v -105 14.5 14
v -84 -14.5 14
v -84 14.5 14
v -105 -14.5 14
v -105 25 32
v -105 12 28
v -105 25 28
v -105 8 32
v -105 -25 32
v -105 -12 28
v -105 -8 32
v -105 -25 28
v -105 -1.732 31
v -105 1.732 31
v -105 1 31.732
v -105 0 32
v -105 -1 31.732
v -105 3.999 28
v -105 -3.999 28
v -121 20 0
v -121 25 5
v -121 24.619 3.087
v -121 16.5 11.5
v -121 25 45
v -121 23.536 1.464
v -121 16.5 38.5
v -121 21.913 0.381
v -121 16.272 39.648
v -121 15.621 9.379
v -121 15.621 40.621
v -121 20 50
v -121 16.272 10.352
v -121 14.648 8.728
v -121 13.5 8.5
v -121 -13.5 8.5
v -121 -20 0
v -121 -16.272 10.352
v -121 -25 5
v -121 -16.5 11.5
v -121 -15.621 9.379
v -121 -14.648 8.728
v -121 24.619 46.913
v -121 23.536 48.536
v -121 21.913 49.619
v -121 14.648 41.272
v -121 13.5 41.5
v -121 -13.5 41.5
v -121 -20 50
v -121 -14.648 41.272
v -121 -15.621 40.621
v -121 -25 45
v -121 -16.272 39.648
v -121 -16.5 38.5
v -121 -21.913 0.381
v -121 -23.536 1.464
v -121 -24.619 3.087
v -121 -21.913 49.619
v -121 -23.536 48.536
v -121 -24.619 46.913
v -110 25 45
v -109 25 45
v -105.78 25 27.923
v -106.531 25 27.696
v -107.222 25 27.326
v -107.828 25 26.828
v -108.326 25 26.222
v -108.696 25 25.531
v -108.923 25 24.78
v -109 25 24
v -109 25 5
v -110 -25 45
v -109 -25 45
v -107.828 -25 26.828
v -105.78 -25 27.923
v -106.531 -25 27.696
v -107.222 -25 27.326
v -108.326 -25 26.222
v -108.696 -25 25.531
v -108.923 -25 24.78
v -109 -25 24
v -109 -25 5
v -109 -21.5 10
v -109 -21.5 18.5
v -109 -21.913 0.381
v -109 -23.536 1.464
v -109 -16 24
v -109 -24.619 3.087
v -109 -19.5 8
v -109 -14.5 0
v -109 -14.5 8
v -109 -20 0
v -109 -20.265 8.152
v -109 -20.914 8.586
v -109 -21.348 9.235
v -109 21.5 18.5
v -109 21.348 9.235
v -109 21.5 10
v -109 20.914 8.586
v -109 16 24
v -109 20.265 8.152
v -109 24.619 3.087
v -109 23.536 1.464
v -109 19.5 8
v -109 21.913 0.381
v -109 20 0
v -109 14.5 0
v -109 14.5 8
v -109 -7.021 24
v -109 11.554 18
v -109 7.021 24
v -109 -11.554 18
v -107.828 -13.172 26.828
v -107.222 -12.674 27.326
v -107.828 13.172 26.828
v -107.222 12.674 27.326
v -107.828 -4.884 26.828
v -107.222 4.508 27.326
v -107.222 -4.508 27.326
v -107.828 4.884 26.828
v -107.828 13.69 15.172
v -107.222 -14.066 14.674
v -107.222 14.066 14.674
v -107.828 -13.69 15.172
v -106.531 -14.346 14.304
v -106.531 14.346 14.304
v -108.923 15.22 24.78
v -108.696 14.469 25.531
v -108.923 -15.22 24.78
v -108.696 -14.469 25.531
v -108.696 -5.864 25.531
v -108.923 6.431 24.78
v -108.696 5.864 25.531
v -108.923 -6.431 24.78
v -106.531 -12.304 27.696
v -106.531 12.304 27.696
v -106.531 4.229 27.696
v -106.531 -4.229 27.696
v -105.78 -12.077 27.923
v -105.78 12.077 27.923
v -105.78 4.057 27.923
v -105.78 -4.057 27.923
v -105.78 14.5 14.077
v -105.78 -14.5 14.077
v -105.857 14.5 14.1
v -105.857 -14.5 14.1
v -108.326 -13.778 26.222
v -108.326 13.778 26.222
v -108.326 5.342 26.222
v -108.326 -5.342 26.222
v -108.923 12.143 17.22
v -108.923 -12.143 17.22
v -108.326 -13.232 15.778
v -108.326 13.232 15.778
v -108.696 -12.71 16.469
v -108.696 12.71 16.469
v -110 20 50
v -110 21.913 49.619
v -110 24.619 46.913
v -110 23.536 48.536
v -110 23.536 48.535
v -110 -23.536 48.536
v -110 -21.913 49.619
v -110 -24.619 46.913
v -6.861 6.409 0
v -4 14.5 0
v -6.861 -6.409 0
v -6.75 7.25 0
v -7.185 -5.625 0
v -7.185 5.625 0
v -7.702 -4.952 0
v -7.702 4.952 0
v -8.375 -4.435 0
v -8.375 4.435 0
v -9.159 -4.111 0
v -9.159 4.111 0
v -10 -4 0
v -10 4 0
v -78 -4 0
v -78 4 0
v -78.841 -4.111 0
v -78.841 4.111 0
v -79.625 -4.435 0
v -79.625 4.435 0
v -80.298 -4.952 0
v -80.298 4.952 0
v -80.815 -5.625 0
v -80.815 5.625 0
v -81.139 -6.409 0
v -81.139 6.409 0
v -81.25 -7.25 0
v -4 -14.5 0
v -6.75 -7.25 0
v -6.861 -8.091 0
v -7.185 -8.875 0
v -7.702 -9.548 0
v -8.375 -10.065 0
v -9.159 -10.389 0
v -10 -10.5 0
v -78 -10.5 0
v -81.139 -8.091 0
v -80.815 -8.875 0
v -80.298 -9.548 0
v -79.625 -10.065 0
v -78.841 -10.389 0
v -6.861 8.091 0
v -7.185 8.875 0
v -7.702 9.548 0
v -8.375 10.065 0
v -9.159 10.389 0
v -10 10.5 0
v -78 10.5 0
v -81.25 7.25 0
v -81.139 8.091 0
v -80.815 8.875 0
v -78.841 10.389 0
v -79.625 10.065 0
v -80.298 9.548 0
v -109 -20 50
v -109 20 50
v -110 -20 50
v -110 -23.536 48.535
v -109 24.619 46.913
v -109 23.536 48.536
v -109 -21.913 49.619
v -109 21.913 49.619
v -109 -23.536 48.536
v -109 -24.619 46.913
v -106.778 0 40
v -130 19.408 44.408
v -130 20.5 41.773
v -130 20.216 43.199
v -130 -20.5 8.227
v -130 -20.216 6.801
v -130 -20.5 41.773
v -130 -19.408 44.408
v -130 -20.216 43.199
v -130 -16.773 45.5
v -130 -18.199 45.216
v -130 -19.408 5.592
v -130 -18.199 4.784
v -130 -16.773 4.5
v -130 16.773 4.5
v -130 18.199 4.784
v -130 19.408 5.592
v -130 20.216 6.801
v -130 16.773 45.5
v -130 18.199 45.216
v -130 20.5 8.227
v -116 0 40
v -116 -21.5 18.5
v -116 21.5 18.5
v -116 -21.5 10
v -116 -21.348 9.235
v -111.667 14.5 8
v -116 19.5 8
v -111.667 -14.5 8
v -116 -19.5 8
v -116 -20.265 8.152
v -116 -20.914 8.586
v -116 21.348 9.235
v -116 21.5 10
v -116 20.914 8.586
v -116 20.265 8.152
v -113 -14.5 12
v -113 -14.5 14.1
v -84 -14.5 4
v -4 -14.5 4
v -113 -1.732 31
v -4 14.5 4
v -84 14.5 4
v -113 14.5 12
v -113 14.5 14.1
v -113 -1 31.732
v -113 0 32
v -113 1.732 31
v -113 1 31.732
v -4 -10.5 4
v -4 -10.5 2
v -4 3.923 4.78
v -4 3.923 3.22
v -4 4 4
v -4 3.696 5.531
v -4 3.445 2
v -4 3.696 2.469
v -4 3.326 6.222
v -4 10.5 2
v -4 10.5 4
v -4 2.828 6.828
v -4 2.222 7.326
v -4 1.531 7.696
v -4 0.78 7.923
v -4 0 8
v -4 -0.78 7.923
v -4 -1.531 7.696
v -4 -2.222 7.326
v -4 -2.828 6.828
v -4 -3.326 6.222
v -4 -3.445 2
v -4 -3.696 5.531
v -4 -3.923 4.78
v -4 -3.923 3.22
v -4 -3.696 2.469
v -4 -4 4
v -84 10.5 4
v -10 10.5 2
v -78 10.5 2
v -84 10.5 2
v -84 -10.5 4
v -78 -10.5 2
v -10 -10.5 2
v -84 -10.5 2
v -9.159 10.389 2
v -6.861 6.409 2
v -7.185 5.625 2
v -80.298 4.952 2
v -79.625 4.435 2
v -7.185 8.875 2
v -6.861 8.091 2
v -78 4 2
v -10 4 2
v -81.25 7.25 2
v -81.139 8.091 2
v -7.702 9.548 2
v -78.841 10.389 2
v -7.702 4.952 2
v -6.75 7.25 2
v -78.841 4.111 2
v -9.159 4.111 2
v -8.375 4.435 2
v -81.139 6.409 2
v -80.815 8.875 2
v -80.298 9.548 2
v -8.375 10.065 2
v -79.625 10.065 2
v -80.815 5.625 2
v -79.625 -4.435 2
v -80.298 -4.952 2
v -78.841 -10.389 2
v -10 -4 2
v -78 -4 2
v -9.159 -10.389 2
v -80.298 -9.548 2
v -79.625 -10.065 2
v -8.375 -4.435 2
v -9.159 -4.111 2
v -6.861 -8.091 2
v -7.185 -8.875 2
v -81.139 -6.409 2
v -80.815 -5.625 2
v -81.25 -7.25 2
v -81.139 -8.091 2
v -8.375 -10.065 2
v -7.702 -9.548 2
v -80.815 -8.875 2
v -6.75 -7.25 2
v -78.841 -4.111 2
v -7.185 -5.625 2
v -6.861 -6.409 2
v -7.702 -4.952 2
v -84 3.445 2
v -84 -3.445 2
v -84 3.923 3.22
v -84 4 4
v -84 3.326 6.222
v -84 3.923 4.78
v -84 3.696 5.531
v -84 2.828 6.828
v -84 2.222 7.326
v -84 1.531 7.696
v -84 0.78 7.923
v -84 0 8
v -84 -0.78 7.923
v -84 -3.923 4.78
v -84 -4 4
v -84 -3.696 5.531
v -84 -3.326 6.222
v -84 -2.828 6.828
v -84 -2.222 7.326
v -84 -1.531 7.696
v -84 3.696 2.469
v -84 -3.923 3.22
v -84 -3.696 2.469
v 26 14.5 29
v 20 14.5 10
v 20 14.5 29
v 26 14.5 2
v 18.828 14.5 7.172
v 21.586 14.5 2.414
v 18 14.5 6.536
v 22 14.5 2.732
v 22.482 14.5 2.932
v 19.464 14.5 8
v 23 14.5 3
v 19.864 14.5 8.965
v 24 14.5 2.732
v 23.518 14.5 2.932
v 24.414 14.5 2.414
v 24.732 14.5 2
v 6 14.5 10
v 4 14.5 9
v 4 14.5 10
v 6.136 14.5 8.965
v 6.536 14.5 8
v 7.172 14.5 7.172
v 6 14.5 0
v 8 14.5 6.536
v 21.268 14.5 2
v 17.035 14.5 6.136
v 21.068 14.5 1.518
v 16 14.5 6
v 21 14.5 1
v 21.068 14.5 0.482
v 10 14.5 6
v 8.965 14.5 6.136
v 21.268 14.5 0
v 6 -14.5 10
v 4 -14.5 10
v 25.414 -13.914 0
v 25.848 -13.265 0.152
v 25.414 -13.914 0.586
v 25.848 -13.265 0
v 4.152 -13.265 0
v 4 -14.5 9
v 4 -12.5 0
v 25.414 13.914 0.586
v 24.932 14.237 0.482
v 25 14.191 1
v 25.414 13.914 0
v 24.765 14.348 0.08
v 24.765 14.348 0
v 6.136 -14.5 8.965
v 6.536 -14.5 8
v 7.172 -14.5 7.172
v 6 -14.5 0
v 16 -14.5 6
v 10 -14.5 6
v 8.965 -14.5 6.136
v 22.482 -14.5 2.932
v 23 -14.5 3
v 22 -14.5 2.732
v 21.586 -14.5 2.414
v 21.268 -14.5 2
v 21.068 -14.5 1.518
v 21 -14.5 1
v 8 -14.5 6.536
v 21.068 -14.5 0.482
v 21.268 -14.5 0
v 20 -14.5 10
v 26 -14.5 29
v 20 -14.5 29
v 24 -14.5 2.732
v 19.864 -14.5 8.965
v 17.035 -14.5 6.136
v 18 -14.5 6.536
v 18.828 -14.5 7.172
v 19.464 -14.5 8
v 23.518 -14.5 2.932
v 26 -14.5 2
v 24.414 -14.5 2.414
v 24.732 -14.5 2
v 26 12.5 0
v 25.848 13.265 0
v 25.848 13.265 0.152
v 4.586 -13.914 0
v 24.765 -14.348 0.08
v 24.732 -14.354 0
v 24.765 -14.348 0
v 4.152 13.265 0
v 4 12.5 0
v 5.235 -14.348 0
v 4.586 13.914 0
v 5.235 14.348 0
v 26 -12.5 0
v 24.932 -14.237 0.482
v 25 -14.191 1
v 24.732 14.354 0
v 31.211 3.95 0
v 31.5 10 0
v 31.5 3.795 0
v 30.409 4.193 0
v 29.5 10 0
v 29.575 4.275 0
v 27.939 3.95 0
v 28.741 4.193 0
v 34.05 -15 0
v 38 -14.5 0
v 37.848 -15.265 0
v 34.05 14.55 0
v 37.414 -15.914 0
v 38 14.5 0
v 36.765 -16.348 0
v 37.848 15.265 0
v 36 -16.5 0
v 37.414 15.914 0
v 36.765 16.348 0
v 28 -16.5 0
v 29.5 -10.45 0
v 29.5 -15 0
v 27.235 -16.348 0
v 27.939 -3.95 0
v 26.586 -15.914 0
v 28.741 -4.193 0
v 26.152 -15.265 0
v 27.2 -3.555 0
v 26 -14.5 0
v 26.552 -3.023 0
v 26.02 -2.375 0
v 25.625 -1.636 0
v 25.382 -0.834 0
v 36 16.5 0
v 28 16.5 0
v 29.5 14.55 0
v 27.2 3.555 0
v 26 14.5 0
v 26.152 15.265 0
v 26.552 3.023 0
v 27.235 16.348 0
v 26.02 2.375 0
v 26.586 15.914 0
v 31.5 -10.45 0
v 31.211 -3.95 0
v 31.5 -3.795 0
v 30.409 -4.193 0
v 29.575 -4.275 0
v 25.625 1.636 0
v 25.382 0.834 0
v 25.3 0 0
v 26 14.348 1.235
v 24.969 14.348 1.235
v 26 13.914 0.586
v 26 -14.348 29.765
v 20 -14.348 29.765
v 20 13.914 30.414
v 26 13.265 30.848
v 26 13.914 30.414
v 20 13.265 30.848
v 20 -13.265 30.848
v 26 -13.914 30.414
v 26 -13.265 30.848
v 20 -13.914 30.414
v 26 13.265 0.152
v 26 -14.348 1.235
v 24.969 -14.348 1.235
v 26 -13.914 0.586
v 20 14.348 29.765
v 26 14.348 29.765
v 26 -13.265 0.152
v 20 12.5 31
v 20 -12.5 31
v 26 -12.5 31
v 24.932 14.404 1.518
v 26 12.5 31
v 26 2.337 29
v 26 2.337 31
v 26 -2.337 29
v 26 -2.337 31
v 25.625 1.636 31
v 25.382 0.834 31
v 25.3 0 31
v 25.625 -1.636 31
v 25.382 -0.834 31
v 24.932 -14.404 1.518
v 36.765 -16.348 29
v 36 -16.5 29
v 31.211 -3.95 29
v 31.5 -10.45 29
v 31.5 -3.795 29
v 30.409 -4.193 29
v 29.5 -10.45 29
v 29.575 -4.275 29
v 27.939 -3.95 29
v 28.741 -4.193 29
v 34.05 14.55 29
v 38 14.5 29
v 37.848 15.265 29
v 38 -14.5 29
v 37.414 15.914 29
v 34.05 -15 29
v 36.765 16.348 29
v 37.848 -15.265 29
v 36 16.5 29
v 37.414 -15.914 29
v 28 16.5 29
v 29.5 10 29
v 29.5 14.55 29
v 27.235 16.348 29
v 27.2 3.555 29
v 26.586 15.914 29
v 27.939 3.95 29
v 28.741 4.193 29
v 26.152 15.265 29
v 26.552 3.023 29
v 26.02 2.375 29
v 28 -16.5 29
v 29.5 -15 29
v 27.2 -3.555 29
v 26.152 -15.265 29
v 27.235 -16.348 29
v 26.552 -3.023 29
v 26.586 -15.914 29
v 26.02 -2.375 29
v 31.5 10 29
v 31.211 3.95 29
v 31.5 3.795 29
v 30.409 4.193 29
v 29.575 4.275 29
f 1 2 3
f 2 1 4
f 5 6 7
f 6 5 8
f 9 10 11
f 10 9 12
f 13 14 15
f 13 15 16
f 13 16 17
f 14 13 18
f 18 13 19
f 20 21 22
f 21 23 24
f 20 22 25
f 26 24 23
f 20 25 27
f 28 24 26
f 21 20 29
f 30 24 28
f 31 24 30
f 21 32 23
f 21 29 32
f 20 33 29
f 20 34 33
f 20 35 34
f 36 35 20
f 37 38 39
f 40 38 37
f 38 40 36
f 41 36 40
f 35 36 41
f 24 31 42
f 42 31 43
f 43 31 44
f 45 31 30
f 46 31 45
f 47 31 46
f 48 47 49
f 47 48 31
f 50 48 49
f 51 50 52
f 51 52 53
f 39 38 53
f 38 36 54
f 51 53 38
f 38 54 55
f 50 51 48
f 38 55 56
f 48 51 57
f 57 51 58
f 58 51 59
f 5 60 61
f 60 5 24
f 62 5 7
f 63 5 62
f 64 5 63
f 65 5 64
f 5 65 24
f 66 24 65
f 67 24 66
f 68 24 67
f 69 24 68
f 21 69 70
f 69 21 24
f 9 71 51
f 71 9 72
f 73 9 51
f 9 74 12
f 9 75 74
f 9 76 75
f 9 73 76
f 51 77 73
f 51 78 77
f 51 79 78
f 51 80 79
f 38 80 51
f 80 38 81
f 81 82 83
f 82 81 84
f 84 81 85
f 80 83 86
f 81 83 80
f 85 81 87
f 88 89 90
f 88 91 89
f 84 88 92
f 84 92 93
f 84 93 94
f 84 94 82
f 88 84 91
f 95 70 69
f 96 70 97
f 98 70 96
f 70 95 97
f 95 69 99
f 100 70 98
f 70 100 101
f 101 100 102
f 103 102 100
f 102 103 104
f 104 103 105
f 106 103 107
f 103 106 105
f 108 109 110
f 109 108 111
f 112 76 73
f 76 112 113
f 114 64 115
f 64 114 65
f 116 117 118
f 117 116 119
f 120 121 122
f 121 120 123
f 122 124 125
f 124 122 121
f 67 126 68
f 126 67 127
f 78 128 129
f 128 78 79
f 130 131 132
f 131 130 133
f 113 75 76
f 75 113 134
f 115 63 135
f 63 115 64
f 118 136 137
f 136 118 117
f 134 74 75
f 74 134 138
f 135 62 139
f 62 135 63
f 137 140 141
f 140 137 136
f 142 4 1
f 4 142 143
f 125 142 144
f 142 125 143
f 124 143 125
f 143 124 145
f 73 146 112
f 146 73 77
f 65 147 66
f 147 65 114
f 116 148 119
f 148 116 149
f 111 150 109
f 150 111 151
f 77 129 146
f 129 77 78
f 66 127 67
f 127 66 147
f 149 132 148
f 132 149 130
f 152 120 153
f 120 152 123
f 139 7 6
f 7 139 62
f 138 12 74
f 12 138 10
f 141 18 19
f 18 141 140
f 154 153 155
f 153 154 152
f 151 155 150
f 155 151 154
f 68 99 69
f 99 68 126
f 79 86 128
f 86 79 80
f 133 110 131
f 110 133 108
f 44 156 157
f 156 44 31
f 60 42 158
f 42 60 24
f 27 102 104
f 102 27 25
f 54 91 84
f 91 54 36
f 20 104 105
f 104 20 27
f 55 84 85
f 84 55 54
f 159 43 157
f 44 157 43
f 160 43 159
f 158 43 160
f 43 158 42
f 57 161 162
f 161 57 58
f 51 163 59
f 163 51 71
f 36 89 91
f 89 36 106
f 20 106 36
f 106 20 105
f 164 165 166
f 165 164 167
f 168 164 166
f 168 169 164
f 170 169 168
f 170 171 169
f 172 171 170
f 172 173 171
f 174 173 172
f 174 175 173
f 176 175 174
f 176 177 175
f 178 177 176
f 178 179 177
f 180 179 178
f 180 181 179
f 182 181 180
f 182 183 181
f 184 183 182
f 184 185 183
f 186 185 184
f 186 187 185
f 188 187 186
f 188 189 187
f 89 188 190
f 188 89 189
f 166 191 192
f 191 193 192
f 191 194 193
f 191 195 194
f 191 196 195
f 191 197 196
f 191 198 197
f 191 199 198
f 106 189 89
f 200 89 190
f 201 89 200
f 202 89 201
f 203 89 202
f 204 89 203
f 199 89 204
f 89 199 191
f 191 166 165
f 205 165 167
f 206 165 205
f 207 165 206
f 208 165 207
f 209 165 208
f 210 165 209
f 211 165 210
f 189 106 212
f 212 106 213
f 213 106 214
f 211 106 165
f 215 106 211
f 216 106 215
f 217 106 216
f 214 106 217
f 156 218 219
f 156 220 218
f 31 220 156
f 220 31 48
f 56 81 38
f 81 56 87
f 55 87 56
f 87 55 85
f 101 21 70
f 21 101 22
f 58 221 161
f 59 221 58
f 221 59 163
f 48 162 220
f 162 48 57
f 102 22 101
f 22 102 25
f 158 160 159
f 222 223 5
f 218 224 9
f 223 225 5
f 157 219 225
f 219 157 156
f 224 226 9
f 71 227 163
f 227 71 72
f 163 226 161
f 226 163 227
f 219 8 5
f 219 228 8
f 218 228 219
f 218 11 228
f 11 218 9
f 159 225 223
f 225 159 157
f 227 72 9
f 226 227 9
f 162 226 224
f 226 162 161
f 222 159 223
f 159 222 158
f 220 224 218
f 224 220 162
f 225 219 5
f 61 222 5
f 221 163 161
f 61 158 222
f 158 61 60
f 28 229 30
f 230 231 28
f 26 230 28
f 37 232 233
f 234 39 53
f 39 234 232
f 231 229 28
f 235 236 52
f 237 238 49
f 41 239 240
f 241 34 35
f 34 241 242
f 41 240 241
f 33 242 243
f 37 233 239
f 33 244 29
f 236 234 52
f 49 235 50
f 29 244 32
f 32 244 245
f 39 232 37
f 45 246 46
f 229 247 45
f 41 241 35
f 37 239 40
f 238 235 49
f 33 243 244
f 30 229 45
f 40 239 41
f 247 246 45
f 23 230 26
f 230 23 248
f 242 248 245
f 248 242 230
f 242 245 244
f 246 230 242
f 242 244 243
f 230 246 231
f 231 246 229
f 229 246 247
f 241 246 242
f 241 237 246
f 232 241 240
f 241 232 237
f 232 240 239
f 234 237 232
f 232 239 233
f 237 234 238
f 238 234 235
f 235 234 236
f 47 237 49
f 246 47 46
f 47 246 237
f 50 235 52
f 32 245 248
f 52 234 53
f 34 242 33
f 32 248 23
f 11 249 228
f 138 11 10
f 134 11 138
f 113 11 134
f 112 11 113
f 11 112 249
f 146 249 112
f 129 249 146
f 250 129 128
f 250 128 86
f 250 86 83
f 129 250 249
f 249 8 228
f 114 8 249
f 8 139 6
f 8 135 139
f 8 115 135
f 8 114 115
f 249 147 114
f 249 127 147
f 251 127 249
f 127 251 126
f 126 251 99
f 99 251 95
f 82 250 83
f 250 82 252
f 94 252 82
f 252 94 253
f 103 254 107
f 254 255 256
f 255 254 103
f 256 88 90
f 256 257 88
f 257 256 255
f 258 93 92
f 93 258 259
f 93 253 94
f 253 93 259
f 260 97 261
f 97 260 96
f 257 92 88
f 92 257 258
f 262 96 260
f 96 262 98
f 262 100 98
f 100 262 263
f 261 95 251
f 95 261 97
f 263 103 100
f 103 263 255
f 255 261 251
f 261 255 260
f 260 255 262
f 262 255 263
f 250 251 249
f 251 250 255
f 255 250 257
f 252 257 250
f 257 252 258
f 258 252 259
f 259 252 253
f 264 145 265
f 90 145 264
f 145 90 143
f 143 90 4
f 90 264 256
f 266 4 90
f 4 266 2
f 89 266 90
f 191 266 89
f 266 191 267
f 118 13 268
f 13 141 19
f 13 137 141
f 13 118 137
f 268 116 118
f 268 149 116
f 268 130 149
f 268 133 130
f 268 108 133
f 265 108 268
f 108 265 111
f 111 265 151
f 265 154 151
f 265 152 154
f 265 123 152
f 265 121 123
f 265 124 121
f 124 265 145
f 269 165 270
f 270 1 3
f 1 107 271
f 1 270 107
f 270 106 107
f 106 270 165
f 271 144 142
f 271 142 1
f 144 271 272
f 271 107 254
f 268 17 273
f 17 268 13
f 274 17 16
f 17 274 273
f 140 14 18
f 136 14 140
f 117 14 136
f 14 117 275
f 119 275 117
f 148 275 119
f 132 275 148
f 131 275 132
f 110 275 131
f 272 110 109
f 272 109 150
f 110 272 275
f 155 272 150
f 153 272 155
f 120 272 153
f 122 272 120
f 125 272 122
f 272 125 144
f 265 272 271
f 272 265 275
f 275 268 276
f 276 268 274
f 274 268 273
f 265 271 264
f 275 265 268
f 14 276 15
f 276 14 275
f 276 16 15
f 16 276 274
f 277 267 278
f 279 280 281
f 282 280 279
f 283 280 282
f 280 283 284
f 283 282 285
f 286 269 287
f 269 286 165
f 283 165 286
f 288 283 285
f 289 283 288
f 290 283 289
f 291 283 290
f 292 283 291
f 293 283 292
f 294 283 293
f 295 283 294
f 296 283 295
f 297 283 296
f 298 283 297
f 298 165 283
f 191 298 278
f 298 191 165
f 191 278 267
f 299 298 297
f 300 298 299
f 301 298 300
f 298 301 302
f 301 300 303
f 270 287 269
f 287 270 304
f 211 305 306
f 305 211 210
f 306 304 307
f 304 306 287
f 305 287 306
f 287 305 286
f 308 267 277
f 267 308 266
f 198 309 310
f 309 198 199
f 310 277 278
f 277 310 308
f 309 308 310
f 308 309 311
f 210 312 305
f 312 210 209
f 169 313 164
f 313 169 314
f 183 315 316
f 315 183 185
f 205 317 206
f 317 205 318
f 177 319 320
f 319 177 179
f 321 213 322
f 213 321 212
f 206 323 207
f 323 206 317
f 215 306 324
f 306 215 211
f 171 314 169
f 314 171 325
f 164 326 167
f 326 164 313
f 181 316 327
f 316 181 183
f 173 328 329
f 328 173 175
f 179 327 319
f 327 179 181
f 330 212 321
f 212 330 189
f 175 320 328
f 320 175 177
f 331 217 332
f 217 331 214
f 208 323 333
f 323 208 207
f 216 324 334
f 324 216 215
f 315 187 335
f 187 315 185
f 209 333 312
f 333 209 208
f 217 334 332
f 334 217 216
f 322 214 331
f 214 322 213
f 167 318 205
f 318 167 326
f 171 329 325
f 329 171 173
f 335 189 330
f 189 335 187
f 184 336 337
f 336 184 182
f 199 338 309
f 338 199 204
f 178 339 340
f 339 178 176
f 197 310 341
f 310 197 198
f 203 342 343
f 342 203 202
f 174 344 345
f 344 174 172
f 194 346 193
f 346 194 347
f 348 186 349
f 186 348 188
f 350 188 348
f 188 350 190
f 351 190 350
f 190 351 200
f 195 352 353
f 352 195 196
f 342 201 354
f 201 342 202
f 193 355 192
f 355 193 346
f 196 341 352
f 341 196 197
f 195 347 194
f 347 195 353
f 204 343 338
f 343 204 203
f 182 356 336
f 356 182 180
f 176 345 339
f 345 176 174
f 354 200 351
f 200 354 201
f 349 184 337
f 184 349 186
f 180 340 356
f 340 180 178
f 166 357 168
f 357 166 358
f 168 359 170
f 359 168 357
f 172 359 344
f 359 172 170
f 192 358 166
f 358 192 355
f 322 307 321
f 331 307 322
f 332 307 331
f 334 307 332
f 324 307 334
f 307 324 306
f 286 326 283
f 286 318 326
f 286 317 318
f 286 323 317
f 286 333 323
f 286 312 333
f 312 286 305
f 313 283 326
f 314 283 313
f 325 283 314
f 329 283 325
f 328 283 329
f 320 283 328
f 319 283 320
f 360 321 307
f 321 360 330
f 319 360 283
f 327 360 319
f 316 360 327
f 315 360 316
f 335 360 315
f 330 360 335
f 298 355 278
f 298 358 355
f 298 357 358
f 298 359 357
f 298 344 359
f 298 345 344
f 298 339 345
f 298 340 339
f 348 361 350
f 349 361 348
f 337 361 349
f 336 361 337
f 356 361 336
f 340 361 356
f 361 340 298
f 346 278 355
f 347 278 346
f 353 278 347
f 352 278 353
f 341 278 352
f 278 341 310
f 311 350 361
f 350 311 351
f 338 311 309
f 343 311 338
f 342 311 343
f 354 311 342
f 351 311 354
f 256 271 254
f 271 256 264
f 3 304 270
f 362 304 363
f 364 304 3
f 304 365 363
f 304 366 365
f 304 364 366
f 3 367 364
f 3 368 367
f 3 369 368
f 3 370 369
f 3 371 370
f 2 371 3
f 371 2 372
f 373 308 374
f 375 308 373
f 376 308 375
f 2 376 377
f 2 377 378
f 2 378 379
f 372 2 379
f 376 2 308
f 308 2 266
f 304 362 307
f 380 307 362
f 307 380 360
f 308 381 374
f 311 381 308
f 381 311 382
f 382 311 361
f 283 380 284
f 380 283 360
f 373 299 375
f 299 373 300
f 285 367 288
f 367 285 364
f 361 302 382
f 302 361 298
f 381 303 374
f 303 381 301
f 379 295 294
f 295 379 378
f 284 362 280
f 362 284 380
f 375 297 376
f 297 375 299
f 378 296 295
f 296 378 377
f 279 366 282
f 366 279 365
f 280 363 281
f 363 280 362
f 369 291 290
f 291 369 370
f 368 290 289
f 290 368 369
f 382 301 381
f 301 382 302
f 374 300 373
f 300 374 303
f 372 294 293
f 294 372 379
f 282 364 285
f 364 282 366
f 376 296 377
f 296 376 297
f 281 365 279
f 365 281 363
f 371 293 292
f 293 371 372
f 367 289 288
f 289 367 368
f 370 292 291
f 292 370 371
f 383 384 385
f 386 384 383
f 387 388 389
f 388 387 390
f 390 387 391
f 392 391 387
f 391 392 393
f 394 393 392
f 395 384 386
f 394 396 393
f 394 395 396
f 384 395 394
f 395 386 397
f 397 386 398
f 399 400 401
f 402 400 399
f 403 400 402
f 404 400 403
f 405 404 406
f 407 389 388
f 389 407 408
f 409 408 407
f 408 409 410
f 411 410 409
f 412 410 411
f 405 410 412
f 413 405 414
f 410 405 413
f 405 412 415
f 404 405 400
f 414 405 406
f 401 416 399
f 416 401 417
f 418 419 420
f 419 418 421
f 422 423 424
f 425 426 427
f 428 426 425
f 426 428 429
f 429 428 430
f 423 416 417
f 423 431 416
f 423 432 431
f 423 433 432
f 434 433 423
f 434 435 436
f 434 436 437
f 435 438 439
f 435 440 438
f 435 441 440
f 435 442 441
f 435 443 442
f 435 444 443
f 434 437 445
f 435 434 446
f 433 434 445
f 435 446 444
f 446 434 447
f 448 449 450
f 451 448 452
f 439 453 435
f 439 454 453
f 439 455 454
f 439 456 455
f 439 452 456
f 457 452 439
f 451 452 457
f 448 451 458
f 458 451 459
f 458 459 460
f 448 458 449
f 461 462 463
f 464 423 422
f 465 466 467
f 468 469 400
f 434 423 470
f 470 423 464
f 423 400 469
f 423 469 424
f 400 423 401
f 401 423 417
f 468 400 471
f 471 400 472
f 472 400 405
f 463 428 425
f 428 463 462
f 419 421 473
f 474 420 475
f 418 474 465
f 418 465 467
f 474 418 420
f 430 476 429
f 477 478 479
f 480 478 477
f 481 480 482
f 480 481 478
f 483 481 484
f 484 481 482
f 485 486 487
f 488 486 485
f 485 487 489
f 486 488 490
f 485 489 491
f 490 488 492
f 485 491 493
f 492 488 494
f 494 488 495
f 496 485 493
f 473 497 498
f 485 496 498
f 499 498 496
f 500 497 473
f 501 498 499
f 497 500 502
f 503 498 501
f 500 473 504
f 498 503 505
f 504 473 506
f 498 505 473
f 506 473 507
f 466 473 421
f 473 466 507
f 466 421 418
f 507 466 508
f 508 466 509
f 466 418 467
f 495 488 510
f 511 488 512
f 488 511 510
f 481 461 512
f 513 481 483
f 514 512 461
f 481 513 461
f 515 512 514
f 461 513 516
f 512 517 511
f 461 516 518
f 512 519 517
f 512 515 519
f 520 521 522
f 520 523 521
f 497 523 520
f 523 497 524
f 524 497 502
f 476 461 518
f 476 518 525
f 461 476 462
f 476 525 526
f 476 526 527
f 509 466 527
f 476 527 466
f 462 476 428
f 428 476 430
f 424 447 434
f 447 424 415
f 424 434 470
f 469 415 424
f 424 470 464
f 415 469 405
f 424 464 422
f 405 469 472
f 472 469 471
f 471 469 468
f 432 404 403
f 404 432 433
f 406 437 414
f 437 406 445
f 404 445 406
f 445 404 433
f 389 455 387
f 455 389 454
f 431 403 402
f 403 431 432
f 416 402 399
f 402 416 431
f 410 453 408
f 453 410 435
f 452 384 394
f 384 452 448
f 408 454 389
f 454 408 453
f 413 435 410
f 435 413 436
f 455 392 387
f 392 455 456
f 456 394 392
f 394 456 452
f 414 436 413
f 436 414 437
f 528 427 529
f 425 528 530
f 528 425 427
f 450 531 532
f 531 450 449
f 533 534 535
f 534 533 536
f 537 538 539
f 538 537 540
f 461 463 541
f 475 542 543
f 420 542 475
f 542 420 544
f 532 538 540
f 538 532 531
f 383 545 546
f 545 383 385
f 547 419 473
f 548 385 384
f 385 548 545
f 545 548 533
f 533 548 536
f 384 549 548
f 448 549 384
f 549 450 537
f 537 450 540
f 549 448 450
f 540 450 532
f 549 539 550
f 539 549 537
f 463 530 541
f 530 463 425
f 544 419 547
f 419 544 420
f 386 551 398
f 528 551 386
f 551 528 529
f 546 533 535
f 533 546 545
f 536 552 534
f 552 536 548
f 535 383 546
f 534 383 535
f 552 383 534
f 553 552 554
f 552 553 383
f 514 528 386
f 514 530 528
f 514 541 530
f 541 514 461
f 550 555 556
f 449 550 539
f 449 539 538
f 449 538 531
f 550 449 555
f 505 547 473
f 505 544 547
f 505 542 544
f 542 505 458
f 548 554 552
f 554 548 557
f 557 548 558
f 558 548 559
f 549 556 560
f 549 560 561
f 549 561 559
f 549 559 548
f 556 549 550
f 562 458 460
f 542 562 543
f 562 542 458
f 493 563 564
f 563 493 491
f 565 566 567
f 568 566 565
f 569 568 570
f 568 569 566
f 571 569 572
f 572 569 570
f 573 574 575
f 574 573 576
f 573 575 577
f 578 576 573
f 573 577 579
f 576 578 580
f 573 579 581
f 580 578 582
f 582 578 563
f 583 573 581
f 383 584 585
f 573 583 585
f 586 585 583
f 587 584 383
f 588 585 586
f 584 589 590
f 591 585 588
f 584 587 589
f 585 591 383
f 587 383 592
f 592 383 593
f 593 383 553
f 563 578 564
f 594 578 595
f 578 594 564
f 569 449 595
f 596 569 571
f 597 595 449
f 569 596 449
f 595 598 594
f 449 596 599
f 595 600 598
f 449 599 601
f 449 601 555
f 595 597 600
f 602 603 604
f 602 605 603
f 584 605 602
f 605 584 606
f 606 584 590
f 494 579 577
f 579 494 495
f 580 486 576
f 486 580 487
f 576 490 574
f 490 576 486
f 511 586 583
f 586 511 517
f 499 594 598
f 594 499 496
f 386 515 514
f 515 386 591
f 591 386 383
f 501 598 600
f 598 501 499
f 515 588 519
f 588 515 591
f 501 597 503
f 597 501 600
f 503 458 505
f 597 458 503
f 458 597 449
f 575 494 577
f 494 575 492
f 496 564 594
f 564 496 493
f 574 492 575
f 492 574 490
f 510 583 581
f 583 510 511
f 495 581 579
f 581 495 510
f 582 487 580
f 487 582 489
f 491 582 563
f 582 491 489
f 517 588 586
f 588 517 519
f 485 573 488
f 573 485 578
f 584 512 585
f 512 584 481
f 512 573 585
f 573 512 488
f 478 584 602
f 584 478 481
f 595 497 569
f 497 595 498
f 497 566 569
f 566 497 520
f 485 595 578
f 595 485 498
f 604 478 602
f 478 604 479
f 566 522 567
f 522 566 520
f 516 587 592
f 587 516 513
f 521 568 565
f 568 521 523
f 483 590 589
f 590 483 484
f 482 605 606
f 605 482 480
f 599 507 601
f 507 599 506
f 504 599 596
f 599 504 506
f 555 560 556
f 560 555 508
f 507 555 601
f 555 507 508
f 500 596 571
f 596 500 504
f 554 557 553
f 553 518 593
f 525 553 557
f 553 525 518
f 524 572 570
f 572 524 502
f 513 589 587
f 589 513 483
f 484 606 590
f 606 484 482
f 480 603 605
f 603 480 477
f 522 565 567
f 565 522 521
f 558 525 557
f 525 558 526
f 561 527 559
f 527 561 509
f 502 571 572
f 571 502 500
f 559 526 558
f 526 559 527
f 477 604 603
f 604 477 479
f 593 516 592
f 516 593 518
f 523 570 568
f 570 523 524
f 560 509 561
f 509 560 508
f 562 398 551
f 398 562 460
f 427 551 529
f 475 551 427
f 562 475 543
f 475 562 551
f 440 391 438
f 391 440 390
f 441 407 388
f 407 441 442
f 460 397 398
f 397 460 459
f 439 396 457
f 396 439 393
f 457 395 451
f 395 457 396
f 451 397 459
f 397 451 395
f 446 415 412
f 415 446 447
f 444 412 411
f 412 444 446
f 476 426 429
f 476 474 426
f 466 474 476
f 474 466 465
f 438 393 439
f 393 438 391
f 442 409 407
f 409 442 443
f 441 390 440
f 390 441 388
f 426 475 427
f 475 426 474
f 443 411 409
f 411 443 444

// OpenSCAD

// -- VARIABLES ---
//height or thickness of the clip/shoe in mm
clip_base = 41;
//inner/upper measurement of the clip/shoe in mm
clip_in = 33;
//height or thickness of the clip/shoe in mm
clip_h = 9;
//width [side of square] of the platform, in mm
plat_w = 50;
//height or thickness of the platform, in mm
plat_h = 12;
//height or length of the slidey posts, in mm
post_h = 105;
//width or thickness of the slidey posts, in mm
post_w = 4;
// "backrest width", mm
br_w = 6;
// "backrest height", mm
br_h = 25;
// "backrest spacing", mm
br_s = 4;
// width of the band (hair tie), in mm
band_w = 4;
//thickness of the phone, in mm (14 should be OK for most phones/cases)
phone_thick = 14;
//make this number larger if the slidey posts are too snug in the slidey post holes
hole_clearance = 0.55;
band_r = band_w/2;
//if you prefer my hard-coded supports to those of your printer software, uncomment the supports section below
support_th = 0.6;

module round_rect(w, l, r){
	translate([-(w-2*r)/2, -(l-2*r)/2, 0])minkowski(){
		square([w-2*r, l-2*r]);
		circle(r, $fn=16);
	}
}

// -- BASE ---
translate([-br_s-post_h, 0, 0])
	union(){
        //backstop
		hull(){
			translate([0, -(plat_w/2+post_w)/2, 0])
				cube([br_h, plat_w/2+post_w, post_w+br_s]);
			translate([-band_w, -plat_w/4-post_w/2, post_w+br_s+br_w-(br_w-band_w)])
				cube([br_h + band_w, plat_w/2+post_w, br_w-band_w]);
		}
		difference(){
			translate([-plat_h, 0, plat_w/2]){
                //clip-shoe
				rotate([0, 270, 0])
					linear_extrude(height=clip_h, scale=[clip_base/clip_in, clip_base/clip_in])
						round_rect(clip_in,clip_in,3);
				rotate([0, 90, 0]){
                    //Base
					linear_extrude(height=plat_h)
						round_rect(plat_w, plat_w, 5);
                    // LIP
                    difference(){
                        translate([plat_w/2-(post_w+br_s+br_w)-(phone_thick+band_w), -plat_w/2, 0])cube([phone_thick+band_w, plat_w, plat_h+band_w]);
                        translate([band_w,-plat_w/2,plat_h])cube([plat_w/3,plat_w/8,band_w*2]);
                        translate([band_w,plat_w/2-plat_w/8,plat_h])cube([plat_w/3,plat_w/8,band_w*2]);
                        hull(){
                            translate([plat_w/2-phone_thick-band_w,-plat_w/2,plat_h+band_w])
                            rotate([-90,0,0])
                            cylinder(r=band_w, h=plat_w, $fn=32);
                            translate([plat_w/2-phone_thick*2+band_w,-plat_w/2,plat_h+band_w])
                            rotate([-90,0,0])
                            cylinder(r=band_w, h=plat_w, $fn=32);
                        }
                    }
                    hull(){
                        translate([plat_w/2-(post_w+br_s+br_w)-(phone_thick+band_w), -plat_w/2, 0])cube([1, plat_w, plat_h+band_w]);
                        translate([-plat_w/2+5,plat_w/2-5,plat_h-1])cylinder(r=5, h=1);
                        translate([-plat_w/2+5,-plat_w/2+5,plat_h-1])cylinder(r=5, h=1);
                    }
				}
			}
			difference(){
				translate([plat_h+1, 0, (phone_thick + br_w + band_r*6)/2 + post_w + br_s])
					rotate([0, 270, 0])
						linear_extrude(height=band_w*2+plat_h)
							round_rect(phone_thick+br_w+band_r*6, plat_w/2+post_w+band_w*3.5, band_r);
				for (i=[-1,1]){
					translate([-band_w*2, i*plat_w*sqrt(2)/2, -plat_w*sqrt(2)/2+(phone_thick + br_w + band_r*6) + post_w + br_s])
						rotate([45, 0, 0])
							cube([band_w*2+plat_h+2, plat_w, plat_w]);
				}
			translate([0, 0, br_s + post_w + br_w])
				hull(){
					translate([-band_w, 0, band_r + phone_thick])
						rotate([0, 90, 0])
							cylinder(h=band_w*3, r=band_r, $fn=12);
						translate([-band_w, -plat_w/4 - post_w/2, 0])
							cube([band_w*3, plat_w/2 + post_w, 0.1]);
				}
			}
		}
        //POST
		for (i=[1,-1]){
			translate([0, -post_w/2 + i*plat_w/4, 0])cube([post_h, post_w, post_w]);
		}
        translate([0,0,post_w])rotate([0,90,0])cylinder(r=post_w, h=post_h, $fn=32);
        difference(){
            translate([0,-plat_w/4,0])cube([post_h, plat_w/2, post_w*0.5]);
            for (i=[1,-1]){
                hull(){
                    translate([post_h-post_w*1.5,i*(plat_w/8+post_w/4),0])cylinder(r=(plat_w/4 - post_w*1.5)/2, h=post_w, $fn=24);
                    translate([br_h+post_w*1.5,i*(plat_w/8+post_w/4),0])cylinder(r=(plat_w/4 - post_w*1.5)/2, h=post_w, $fn=24);
                }
            }
        }
	}



// -- base supports ---
//translate([-plat_h-br_s-post_h-clip_h,0,0]){
//    difference(){
//        translate([0,-21,0])cube([8,40,8]);
//        for (i = [-21:6:21]){
//            translate([0,i,0])cube([clip_h-1-support_th,3-support_th,clip_h-1]);
//            translate([support_th,i-3,0])cube([clip_h-1-support_th,3-support_th,clip_h-1]);
//        }
//        translate([clip_h, 0, plat_w/2 - 0.05])
//        rotate([0, 270, 0])
//        linear_extrude(height=clip_h, scale=[clip_base/clip_in, clip_base/clip_in])
//        round_rect(clip_in,clip_in,3);
//    }
//}


// -- TOP --
difference(){
	union(){
        difference(){
            hull(){
                translate([br_s+(phone_thick+band_r+br_w)/2, 0, 0])
                    linear_extrude(height=br_w)
                        round_rect(phone_thick+band_r+br_w, plat_w/2 + post_w, band_r);
                // ---lip
                translate([br_s, -(plat_w/2 + band_w)/2, br_w+band_w-1])
                    cube([phone_thick+band_r, plat_w/2 + band_w, 1]);
            }
            hull(){
                translate([br_s+phone_thick-band_r,-plat_w/4-band_r,br_w+band_w])rotate([-90,0,0])cylinder(h=plat_w/2+band_w, r=band_w, $fn=24);
                translate([br_s+band_w*1.5,-plat_w/4-band_r,br_w+band_w])rotate([-90,0,0])cylinder(h=plat_w/2+band_w, r=band_w, $fn=24);
            }
        }
        
        //backrest
		translate([br_s + band_r + phone_thick, 0, (br_w+br_h)/2])
			rotate([0, 90, 0])
				linear_extrude(height=br_w)
					round_rect(br_w+br_h, plat_w/2 + post_w, band_r);
        //slothouse
		translate([(br_w*2+br_s*2 + post_w)/2+br_s+band_r+phone_thick, 0, 0])
			linear_extrude(height=br_w+br_h-band_r)
				round_rect(br_s*2 + post_w, plat_w/2 + post_w+band_w, band_r);
	}
    // slide holes
	for (i=[1,-1]){
		translate([br_s*2+band_r+phone_thick+br_w-0.5, -(post_w+1)/2 + i*plat_w/4, -5])
			cube([post_w+hole_clearance, post_w+hole_clearance, post_h]);
	}
    translate([br_s*2+band_r+phone_thick+br_w-0.5+post_w/2, -plat_w/4, -5])cube([post_w/2+hole_clearance,plat_w/2,post_h]);
    translate([br_s*2+band_r+phone_thick+br_w-0.425,0,-5])cylinder(r=post_w+hole_clearance/2, h=post_h, $fn=32);
    
    // Band Slot
	translate([br_s+band_r*2.5+phone_thick, 0, 0])
		rotate([90,0,0])translate([0,band_r/2,-(br_h+br_w)/2])cylinder(r=band_r, h=br_h+br_w, $fn=24);
}
